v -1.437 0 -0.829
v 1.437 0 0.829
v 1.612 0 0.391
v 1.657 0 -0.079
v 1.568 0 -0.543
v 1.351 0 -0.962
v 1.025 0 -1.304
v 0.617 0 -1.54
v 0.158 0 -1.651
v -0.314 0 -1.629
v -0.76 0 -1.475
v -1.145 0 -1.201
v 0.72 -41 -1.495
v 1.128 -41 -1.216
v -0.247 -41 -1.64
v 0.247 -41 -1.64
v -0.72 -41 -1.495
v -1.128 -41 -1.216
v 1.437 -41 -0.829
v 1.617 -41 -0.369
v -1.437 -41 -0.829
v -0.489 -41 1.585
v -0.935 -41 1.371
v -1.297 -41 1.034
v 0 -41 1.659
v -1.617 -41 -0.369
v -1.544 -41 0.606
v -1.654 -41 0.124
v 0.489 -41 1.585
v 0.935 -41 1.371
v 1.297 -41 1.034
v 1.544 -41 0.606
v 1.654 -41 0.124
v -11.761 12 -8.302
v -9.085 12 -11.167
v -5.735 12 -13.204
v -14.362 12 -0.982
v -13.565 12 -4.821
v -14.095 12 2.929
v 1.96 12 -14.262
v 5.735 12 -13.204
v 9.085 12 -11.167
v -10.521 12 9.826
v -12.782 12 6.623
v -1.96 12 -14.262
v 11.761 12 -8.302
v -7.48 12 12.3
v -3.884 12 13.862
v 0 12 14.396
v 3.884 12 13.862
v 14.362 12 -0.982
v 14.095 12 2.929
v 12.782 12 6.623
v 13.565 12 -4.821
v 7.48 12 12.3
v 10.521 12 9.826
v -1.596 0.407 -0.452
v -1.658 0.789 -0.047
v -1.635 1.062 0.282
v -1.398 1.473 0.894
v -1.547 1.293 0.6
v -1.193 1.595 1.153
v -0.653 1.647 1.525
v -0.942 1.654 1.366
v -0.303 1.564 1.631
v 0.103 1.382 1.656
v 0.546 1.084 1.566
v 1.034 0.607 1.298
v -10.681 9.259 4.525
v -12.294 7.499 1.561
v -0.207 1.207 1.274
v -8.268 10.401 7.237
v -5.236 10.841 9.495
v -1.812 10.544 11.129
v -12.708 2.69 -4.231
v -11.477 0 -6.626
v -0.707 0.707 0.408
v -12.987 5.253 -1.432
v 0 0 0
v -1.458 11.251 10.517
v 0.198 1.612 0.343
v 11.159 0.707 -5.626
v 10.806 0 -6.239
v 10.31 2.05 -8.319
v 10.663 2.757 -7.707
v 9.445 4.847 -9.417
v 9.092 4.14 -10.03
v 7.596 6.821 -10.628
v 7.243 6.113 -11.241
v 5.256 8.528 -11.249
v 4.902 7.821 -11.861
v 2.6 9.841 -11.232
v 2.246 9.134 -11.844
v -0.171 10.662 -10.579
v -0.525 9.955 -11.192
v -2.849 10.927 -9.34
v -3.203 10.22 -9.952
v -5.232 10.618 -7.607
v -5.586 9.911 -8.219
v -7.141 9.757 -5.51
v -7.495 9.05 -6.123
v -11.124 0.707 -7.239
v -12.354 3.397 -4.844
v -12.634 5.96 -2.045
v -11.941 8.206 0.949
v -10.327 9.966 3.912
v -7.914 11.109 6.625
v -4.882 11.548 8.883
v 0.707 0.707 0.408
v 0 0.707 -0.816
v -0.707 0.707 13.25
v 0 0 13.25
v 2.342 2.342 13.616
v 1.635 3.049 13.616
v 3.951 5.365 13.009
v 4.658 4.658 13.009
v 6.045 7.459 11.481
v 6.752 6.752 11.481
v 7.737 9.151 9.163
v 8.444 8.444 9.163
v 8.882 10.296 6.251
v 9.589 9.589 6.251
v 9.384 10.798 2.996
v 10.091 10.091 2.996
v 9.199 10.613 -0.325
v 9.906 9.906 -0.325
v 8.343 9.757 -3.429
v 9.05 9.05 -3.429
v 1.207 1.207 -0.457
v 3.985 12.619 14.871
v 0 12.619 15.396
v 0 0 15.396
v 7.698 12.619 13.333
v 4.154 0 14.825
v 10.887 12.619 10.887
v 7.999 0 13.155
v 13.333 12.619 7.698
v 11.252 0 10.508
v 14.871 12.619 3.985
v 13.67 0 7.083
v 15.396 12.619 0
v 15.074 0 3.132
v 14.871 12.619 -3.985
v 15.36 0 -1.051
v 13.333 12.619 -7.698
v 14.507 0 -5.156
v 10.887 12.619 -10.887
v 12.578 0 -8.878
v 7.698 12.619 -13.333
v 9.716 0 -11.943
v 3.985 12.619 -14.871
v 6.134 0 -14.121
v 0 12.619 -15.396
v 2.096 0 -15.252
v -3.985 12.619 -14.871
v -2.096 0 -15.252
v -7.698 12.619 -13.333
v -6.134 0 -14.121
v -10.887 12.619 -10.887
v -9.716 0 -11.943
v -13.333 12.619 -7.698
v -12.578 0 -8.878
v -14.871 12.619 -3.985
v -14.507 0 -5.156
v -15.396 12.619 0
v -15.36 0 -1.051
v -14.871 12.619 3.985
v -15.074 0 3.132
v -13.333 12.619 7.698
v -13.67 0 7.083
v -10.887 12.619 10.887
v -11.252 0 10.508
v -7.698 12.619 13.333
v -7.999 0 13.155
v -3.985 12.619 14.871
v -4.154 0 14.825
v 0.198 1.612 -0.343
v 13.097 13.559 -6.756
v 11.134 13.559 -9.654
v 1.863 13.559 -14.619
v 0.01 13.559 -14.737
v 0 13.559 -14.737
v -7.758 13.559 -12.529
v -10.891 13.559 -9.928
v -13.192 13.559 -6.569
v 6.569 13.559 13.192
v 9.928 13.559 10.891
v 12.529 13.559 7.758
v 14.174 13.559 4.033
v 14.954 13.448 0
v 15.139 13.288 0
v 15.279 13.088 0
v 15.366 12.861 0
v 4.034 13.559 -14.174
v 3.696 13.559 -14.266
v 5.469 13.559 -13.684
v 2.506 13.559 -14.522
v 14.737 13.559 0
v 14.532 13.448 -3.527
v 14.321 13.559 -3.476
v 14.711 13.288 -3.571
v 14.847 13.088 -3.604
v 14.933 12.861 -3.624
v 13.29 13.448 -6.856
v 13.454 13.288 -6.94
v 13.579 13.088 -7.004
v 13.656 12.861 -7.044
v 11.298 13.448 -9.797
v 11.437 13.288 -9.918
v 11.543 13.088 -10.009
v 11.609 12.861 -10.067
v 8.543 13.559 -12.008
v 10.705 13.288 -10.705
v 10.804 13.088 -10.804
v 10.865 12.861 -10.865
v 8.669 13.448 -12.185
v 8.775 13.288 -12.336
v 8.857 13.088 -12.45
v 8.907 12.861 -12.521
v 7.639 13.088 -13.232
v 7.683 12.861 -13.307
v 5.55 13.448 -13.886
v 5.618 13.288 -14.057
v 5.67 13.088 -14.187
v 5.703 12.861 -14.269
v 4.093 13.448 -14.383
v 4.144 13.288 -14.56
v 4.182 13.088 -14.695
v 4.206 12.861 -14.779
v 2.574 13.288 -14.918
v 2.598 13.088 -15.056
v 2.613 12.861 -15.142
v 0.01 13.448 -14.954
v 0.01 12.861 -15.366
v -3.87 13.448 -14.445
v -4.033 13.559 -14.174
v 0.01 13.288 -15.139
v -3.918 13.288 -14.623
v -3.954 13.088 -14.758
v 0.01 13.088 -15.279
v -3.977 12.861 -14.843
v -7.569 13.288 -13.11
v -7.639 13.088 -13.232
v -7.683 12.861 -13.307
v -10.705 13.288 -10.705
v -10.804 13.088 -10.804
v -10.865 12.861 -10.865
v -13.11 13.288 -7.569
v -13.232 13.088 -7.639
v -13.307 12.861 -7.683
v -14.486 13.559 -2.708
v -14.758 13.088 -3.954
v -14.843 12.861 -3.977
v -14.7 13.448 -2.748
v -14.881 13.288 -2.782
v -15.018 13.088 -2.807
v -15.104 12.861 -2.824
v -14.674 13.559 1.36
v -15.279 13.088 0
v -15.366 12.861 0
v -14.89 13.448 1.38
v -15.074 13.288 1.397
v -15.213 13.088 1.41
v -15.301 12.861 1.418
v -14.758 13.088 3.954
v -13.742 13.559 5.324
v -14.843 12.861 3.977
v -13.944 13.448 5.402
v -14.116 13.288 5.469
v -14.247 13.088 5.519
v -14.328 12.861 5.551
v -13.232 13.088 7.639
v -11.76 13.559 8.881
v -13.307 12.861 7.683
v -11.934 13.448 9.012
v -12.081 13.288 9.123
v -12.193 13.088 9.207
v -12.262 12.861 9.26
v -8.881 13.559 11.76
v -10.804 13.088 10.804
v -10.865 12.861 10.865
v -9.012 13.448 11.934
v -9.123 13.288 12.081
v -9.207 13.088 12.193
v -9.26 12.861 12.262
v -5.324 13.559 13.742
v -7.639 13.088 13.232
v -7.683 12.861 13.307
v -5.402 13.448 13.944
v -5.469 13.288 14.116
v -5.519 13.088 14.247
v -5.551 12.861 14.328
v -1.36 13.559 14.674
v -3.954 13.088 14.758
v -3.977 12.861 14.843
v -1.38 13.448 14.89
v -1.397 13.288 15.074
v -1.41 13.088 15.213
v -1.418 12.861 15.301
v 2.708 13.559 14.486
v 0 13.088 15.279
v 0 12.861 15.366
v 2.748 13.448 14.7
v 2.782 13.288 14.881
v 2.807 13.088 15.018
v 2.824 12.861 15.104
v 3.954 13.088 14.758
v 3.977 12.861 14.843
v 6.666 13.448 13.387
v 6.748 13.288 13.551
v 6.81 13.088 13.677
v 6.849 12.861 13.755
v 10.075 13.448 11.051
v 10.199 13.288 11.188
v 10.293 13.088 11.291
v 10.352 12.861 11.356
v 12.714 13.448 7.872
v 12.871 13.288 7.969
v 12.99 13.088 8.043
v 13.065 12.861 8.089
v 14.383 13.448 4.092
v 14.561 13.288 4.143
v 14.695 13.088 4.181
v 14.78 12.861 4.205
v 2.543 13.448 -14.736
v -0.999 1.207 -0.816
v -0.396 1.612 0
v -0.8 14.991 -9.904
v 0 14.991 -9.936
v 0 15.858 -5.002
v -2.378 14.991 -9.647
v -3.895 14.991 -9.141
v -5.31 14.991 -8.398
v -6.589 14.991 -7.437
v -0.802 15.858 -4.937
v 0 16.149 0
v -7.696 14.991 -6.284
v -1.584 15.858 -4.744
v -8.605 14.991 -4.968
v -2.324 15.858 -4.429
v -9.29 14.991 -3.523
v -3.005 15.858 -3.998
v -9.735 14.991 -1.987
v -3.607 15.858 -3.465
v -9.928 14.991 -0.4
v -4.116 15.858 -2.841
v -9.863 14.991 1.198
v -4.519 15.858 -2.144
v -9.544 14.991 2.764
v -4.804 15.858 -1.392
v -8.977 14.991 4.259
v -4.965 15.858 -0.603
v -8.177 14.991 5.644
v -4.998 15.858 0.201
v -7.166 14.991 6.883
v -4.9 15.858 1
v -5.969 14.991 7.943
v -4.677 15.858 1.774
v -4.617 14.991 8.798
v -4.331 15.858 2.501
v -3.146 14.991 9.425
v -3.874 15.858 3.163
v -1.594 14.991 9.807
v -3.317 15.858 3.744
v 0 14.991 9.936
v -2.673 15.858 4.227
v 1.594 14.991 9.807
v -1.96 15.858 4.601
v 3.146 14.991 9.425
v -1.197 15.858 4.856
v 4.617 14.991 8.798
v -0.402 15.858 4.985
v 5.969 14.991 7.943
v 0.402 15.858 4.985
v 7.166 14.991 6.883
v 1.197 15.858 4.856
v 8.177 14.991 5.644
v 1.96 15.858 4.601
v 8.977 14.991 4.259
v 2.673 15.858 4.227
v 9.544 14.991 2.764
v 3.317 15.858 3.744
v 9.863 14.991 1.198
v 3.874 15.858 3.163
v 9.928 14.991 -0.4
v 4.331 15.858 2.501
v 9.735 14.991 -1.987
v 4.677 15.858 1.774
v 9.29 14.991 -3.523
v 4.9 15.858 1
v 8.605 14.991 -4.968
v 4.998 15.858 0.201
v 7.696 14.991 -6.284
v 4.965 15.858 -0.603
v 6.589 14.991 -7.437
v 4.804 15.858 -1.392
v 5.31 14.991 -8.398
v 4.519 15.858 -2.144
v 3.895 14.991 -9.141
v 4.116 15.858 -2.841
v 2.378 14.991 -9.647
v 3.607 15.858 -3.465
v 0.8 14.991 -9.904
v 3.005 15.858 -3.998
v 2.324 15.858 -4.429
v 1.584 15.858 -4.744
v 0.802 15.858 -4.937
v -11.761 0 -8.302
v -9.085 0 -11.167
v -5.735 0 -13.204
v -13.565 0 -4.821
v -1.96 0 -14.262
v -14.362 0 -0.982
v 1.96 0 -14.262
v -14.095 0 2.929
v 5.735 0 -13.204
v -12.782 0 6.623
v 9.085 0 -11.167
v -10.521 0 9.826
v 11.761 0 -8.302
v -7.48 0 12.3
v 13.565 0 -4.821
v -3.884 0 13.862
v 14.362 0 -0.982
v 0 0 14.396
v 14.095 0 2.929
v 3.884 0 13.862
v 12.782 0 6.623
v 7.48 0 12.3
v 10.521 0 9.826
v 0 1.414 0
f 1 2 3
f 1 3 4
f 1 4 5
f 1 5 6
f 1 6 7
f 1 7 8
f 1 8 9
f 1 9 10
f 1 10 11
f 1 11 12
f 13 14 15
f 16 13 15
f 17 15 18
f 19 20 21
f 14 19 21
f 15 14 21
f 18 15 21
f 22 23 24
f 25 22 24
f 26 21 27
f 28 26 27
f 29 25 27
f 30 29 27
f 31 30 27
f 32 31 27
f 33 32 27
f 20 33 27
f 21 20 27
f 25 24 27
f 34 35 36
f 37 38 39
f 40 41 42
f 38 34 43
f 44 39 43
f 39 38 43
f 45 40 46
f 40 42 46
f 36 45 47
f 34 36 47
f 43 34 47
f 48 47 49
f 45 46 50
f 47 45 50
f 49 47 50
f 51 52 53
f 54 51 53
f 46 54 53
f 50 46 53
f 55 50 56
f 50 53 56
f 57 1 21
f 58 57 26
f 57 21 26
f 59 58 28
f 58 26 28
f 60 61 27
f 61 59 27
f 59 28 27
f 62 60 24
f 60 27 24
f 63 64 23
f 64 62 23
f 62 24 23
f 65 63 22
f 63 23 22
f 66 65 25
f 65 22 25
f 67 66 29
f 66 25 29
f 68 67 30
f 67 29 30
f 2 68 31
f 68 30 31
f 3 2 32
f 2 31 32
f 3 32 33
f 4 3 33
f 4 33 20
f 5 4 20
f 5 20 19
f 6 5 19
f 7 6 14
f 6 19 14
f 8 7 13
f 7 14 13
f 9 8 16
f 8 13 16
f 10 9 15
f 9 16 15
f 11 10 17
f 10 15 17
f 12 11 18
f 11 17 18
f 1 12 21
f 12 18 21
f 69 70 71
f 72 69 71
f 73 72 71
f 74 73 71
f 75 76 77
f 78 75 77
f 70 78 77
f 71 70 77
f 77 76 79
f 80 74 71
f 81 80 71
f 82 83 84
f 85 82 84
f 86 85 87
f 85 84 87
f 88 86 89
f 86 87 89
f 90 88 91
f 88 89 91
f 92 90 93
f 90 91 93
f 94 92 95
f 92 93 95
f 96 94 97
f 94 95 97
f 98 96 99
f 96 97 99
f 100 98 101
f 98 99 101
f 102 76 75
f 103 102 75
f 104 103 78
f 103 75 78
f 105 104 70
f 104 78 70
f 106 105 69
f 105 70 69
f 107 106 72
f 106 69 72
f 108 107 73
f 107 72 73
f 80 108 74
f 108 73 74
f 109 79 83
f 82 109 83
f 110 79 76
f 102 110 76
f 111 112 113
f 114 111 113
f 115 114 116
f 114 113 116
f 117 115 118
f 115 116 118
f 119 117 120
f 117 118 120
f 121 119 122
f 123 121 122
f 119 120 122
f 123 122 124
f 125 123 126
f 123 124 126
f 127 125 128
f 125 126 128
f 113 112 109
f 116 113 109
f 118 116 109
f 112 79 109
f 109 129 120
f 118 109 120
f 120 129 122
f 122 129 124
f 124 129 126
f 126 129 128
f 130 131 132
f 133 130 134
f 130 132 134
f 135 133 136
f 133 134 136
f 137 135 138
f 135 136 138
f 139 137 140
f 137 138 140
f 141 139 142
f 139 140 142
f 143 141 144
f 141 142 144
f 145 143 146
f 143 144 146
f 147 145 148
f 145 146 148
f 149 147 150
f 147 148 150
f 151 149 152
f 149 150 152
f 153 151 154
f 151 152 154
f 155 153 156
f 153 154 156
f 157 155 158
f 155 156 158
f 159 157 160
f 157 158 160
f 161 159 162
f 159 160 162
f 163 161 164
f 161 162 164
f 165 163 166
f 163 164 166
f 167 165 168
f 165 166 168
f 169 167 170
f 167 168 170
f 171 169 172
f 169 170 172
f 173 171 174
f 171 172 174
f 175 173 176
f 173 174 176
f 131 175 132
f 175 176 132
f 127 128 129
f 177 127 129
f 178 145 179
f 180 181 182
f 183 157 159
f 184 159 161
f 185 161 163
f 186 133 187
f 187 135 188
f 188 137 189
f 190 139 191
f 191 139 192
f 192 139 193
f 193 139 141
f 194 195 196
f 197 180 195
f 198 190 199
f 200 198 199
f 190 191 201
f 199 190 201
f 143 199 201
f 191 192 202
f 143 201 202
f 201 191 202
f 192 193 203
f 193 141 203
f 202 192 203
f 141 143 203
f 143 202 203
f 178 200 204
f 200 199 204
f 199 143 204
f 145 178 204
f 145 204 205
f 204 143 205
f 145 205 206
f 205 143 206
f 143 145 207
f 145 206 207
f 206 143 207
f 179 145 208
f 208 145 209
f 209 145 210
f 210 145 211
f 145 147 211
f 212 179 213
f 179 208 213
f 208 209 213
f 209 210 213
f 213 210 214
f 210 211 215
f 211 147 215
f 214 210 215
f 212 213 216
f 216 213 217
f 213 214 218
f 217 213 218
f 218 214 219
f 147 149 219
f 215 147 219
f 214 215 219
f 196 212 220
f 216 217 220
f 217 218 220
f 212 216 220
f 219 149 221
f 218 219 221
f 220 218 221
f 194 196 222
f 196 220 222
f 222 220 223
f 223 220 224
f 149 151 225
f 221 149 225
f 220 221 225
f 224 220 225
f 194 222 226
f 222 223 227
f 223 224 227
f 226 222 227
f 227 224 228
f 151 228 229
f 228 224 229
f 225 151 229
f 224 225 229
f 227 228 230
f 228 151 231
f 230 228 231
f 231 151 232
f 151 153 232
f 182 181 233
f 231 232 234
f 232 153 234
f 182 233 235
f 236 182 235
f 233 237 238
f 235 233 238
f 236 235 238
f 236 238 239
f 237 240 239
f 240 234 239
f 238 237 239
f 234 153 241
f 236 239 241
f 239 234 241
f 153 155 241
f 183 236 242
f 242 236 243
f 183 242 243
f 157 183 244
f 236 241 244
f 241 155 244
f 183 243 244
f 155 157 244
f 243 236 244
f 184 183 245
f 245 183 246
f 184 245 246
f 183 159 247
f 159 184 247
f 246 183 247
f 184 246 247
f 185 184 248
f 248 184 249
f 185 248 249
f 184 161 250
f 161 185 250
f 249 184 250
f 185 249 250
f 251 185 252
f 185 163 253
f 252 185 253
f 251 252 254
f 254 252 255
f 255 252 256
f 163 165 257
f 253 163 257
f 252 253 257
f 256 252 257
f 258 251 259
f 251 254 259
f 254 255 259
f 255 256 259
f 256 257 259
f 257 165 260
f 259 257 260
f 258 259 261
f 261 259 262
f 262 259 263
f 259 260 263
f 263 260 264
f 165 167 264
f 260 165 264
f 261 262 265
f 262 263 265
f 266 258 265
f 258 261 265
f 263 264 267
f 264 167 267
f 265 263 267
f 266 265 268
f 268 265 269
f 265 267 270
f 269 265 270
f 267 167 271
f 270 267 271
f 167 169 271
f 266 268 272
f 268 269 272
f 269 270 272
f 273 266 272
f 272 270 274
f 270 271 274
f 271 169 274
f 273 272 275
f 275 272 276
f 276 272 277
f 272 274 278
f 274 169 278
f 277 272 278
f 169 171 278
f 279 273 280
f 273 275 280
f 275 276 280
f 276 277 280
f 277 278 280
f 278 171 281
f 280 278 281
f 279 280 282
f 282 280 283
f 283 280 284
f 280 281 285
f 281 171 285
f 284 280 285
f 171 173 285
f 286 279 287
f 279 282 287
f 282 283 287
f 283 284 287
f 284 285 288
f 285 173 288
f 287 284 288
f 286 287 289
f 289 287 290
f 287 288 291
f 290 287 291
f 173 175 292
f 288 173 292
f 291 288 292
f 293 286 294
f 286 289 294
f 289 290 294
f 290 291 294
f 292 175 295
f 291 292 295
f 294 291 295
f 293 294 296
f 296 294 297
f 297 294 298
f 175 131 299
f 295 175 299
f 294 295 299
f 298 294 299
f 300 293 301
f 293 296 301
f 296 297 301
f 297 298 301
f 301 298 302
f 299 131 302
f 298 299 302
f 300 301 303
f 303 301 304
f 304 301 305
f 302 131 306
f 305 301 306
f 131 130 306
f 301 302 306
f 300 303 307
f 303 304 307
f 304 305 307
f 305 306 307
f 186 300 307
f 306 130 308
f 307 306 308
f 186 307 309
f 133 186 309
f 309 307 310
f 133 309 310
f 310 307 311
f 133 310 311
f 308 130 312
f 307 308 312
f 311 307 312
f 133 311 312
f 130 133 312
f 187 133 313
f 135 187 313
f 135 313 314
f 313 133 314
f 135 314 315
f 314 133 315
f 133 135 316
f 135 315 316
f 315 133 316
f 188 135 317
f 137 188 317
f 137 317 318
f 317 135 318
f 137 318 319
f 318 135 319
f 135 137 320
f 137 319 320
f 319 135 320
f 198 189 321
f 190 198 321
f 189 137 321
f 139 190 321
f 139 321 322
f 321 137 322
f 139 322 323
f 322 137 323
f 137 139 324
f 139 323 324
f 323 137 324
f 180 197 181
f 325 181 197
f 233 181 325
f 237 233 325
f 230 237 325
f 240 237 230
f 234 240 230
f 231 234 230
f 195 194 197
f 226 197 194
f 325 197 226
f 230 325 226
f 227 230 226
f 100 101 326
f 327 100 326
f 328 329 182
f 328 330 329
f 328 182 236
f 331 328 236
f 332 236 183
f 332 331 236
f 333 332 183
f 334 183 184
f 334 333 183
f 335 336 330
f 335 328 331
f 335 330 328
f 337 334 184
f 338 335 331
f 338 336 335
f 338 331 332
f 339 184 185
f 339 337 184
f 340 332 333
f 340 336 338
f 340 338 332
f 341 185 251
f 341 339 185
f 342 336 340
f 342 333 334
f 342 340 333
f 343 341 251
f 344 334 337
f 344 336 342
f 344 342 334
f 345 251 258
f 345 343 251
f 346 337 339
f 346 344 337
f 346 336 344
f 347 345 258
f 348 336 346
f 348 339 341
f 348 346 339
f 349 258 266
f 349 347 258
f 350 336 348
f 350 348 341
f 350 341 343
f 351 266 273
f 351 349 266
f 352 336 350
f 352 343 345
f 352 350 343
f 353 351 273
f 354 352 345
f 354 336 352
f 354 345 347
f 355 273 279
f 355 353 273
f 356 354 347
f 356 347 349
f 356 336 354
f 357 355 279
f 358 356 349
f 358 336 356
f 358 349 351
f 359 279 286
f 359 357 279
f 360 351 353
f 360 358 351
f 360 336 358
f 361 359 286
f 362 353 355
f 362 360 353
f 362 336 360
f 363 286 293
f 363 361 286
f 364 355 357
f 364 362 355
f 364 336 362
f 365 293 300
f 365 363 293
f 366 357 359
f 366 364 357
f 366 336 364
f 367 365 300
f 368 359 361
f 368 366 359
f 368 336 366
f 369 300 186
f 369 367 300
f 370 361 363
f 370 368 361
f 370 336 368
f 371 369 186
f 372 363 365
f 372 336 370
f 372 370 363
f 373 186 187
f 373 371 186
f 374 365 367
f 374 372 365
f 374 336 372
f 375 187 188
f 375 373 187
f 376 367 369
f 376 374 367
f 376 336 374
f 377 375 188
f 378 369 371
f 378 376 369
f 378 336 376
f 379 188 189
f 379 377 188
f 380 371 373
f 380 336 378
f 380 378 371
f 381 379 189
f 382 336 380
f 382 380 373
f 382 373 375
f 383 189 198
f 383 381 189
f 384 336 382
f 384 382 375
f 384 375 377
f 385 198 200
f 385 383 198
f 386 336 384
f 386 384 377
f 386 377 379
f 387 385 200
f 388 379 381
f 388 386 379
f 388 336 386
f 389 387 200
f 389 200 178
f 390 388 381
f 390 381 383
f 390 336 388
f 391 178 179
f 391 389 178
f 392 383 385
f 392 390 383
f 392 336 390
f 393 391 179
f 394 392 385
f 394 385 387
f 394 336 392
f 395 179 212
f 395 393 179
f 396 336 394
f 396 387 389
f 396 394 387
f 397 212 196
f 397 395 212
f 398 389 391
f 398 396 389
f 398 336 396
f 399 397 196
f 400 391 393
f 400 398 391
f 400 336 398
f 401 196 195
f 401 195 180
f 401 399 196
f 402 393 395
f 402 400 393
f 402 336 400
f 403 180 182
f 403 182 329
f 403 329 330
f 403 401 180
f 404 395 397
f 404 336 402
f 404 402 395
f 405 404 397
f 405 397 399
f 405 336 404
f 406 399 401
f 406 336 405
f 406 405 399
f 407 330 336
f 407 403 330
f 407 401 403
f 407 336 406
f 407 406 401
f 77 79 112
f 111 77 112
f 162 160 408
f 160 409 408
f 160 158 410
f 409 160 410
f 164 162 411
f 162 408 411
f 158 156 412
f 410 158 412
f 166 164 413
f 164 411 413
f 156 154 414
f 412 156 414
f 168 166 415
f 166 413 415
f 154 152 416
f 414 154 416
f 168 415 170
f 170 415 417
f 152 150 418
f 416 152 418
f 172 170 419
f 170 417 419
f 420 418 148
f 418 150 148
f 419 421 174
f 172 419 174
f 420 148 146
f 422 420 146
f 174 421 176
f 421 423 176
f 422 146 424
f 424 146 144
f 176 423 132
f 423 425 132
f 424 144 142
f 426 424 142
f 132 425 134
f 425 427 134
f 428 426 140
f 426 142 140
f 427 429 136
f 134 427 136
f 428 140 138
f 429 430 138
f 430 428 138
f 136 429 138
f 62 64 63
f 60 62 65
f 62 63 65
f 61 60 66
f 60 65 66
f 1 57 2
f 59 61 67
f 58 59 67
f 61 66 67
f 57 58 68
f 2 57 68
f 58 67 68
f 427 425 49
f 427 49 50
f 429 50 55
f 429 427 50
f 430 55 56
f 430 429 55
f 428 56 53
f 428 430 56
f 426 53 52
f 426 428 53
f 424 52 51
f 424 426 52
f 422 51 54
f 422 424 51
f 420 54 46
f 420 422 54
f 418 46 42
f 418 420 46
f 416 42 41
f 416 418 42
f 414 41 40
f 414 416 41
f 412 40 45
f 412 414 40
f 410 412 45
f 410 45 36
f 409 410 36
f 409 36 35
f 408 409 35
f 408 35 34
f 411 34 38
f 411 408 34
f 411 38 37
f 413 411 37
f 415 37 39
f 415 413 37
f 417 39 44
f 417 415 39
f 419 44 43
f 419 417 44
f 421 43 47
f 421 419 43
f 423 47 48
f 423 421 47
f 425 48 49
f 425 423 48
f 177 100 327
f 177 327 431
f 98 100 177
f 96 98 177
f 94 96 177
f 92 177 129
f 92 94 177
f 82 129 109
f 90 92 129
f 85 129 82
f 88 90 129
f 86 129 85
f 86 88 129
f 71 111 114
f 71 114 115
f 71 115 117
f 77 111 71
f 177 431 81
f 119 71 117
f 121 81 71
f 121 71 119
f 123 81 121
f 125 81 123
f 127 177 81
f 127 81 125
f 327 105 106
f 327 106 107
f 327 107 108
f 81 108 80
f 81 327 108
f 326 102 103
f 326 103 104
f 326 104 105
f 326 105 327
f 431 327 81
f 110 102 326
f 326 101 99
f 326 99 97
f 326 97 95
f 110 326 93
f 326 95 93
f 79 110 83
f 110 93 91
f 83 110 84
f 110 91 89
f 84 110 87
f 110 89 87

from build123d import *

# Parameters (mm, degrees)
BOSS_EXTRUDE1_DEPTH             = 1
BOSS_EXTRUDE2_DEPTH             = 1
BOSS_EXTRUDE3_DEPTH             = 1
SKETCH5_R                       = 1.658940309
BOSS_EXTRUDE4_DEPTH             = 41
BOSS_EXTRUDE4_DIRECTION_2_REACH = 24.097
SKETCH6_R                       = 15.395853367
SKETCH6_R_2                     = 14.395853367
BOSS_EXTRUDE5_DEPTH             = 12
SKETCH7_R                       = 15.395853367
BOSS_EXTRUDE6_DEPTH             = 11
FILLET1_R                       = 1


with BuildPart() as part:
    # Sketch2 → Boss-Extrude1 (new body)
    with BuildSketch(Plane(origin=(0, 0, 0), x_dir=(0.7071067811865464, 0.7071067811865488, 0), z_dir=(-0.7071067811865488, 0.7071067811865464, 0))):
        with BuildLine():
            Line((12.798517198, 3.429352348), (0, 0))
            Line((0, 0), (0, -13.25))
            ThreePointArc((0, -13.25), (11.941121051, -9.162744449), (12.798517198, 3.429352348))
        make_face()
    extrude(amount=BOSS_EXTRUDE1_DEPTH)

    # Sketch3 → Boss-Extrude2 (add)
    with BuildSketch(Plane(origin=(0, 0, 0), x_dir=(0.9267766952966354, -0.3535533905932773, 0.1268264840443233), z_dir=(0.3535533905932773, 0.7071067811865464, -0.6123724356957939))):
        with BuildLine():
            Line((-3.995589253, -14.911742098), (0, 0))
            Line((0, 0), (-11.477103172, 6.626308606))
            ThreePointArc((-11.477103172, 6.626308606), (-13.346478341, -6.091466992), (-3.995589253, -14.911742098))
        make_face()
    extrude(amount=BOSS_EXTRUDE2_DEPTH)

    # Sketch4 → Boss-Extrude3 (add)
    with BuildSketch(Plane(origin=(0, 0, 0), x_dir=(0.926776695296639, -0.35355339059326873, -0.1268264840443212), z_dir=(0.3535533905932687, 0.7071067811865464, 0.6123724356957988))):
        with BuildLine():
            Line((-9.369164851, 9.369164851), (0, 0))
            Line((0, 0), (10.80558923, 6.238609851))
            ThreePointArc((10.80558923, 6.238609851), (1.834027886, 14.994723252), (-9.369164851, 9.369164851))
        make_face()
    extrude(amount=BOSS_EXTRUDE3_DEPTH)


with BuildPart() as body_2:
    # Sketch5 → Boss-Extrude4 (new body)
    with BuildSketch(Plane(origin=(0, 0, 0), x_dir=(1, 0, 0), z_dir=(0, 1, 0))):
        Circle(SKETCH5_R)
    extrude(amount=-BOSS_EXTRUDE4_DEPTH)


    # Boss-Extrude4 direction 2: up to this face of the body (flat: up to its plane)
    boss_extrude4_direction_2_end = Plane(part.part.faces().sort_by_distance((-6.525054455, 5.025095219, 2.035238209))[0])
    # Sketch5 → Boss-Extrude4 direction 2 (add, up to the picked face)
    with BuildSketch(Plane(origin=(0, 0, 0), x_dir=(1, 0, 0), z_dir=(0, 1, 0)), mode=Mode.PRIVATE) as boss_extrude4_direction_2_sk1:
        Circle(SKETCH5_R)
    boss_extrude4_direction_2_tool1 = split(extrude(boss_extrude4_direction_2_sk1.sketch, amount=BOSS_EXTRUDE4_DIRECTION_2_REACH, mode=Mode.PRIVATE), bisect_by=boss_extrude4_direction_2_end, keep=Keep.BOTH, mode=Mode.PRIVATE)
    add(boss_extrude4_direction_2_tool1.solids().sort_by(Axis((0, 0, 0), (0, 1, 0)))[0])


with BuildPart() as body_3:
    # Sketch6 → Boss-Extrude5 (new body)
    with BuildSketch(Plane(origin=(0, 0, 0), x_dir=(1, 0, 0), z_dir=(0, 1, 0))):
        Circle(SKETCH6_R)
        Circle(SKETCH6_R_2, mode=Mode.SUBTRACT)
    extrude(amount=BOSS_EXTRUDE5_DEPTH)

    # Sketch7 → Boss-Extrude6 (add)
    with BuildSketch(Plane(origin=(0, 12, 0), x_dir=(1, 0, 0), z_dir=(0, 1, 0))):
        Circle(SKETCH7_R)
    extrude(amount=BOSS_EXTRUDE6_DEPTH)

    # Sketch8 → Cut-Revolve2 (revolve, cut)
    with BuildSketch(Plane.XY):
        with BuildLine():
            Line((0, 16.148504019), (0, 23.90296441))
            Line((0, 23.90296441), (16.293851605, 23.90296441))
            Line((16.293851605, 23.90296441), (16.293851605, 12.959716191))
            ThreePointArc((16.293851605, 12.959716191), (8.30147529, 15.343816585), (0, 16.148504019))
        make_face()
    revolve(axis=Axis((0, 16.148504019, 0), (0, 1, 0)), mode=Mode.SUBTRACT)

    # Fillet1
    fillet1_edges = [body_3.edges().sort_by_distance(p)[0] for p in [
        (-15.395853365, 13.313564653, 0),
    ]]
    fillet(fillet1_edges, radius=FILLET1_R)


solid = Compound([part.part, body_2.part, body_3.part])
